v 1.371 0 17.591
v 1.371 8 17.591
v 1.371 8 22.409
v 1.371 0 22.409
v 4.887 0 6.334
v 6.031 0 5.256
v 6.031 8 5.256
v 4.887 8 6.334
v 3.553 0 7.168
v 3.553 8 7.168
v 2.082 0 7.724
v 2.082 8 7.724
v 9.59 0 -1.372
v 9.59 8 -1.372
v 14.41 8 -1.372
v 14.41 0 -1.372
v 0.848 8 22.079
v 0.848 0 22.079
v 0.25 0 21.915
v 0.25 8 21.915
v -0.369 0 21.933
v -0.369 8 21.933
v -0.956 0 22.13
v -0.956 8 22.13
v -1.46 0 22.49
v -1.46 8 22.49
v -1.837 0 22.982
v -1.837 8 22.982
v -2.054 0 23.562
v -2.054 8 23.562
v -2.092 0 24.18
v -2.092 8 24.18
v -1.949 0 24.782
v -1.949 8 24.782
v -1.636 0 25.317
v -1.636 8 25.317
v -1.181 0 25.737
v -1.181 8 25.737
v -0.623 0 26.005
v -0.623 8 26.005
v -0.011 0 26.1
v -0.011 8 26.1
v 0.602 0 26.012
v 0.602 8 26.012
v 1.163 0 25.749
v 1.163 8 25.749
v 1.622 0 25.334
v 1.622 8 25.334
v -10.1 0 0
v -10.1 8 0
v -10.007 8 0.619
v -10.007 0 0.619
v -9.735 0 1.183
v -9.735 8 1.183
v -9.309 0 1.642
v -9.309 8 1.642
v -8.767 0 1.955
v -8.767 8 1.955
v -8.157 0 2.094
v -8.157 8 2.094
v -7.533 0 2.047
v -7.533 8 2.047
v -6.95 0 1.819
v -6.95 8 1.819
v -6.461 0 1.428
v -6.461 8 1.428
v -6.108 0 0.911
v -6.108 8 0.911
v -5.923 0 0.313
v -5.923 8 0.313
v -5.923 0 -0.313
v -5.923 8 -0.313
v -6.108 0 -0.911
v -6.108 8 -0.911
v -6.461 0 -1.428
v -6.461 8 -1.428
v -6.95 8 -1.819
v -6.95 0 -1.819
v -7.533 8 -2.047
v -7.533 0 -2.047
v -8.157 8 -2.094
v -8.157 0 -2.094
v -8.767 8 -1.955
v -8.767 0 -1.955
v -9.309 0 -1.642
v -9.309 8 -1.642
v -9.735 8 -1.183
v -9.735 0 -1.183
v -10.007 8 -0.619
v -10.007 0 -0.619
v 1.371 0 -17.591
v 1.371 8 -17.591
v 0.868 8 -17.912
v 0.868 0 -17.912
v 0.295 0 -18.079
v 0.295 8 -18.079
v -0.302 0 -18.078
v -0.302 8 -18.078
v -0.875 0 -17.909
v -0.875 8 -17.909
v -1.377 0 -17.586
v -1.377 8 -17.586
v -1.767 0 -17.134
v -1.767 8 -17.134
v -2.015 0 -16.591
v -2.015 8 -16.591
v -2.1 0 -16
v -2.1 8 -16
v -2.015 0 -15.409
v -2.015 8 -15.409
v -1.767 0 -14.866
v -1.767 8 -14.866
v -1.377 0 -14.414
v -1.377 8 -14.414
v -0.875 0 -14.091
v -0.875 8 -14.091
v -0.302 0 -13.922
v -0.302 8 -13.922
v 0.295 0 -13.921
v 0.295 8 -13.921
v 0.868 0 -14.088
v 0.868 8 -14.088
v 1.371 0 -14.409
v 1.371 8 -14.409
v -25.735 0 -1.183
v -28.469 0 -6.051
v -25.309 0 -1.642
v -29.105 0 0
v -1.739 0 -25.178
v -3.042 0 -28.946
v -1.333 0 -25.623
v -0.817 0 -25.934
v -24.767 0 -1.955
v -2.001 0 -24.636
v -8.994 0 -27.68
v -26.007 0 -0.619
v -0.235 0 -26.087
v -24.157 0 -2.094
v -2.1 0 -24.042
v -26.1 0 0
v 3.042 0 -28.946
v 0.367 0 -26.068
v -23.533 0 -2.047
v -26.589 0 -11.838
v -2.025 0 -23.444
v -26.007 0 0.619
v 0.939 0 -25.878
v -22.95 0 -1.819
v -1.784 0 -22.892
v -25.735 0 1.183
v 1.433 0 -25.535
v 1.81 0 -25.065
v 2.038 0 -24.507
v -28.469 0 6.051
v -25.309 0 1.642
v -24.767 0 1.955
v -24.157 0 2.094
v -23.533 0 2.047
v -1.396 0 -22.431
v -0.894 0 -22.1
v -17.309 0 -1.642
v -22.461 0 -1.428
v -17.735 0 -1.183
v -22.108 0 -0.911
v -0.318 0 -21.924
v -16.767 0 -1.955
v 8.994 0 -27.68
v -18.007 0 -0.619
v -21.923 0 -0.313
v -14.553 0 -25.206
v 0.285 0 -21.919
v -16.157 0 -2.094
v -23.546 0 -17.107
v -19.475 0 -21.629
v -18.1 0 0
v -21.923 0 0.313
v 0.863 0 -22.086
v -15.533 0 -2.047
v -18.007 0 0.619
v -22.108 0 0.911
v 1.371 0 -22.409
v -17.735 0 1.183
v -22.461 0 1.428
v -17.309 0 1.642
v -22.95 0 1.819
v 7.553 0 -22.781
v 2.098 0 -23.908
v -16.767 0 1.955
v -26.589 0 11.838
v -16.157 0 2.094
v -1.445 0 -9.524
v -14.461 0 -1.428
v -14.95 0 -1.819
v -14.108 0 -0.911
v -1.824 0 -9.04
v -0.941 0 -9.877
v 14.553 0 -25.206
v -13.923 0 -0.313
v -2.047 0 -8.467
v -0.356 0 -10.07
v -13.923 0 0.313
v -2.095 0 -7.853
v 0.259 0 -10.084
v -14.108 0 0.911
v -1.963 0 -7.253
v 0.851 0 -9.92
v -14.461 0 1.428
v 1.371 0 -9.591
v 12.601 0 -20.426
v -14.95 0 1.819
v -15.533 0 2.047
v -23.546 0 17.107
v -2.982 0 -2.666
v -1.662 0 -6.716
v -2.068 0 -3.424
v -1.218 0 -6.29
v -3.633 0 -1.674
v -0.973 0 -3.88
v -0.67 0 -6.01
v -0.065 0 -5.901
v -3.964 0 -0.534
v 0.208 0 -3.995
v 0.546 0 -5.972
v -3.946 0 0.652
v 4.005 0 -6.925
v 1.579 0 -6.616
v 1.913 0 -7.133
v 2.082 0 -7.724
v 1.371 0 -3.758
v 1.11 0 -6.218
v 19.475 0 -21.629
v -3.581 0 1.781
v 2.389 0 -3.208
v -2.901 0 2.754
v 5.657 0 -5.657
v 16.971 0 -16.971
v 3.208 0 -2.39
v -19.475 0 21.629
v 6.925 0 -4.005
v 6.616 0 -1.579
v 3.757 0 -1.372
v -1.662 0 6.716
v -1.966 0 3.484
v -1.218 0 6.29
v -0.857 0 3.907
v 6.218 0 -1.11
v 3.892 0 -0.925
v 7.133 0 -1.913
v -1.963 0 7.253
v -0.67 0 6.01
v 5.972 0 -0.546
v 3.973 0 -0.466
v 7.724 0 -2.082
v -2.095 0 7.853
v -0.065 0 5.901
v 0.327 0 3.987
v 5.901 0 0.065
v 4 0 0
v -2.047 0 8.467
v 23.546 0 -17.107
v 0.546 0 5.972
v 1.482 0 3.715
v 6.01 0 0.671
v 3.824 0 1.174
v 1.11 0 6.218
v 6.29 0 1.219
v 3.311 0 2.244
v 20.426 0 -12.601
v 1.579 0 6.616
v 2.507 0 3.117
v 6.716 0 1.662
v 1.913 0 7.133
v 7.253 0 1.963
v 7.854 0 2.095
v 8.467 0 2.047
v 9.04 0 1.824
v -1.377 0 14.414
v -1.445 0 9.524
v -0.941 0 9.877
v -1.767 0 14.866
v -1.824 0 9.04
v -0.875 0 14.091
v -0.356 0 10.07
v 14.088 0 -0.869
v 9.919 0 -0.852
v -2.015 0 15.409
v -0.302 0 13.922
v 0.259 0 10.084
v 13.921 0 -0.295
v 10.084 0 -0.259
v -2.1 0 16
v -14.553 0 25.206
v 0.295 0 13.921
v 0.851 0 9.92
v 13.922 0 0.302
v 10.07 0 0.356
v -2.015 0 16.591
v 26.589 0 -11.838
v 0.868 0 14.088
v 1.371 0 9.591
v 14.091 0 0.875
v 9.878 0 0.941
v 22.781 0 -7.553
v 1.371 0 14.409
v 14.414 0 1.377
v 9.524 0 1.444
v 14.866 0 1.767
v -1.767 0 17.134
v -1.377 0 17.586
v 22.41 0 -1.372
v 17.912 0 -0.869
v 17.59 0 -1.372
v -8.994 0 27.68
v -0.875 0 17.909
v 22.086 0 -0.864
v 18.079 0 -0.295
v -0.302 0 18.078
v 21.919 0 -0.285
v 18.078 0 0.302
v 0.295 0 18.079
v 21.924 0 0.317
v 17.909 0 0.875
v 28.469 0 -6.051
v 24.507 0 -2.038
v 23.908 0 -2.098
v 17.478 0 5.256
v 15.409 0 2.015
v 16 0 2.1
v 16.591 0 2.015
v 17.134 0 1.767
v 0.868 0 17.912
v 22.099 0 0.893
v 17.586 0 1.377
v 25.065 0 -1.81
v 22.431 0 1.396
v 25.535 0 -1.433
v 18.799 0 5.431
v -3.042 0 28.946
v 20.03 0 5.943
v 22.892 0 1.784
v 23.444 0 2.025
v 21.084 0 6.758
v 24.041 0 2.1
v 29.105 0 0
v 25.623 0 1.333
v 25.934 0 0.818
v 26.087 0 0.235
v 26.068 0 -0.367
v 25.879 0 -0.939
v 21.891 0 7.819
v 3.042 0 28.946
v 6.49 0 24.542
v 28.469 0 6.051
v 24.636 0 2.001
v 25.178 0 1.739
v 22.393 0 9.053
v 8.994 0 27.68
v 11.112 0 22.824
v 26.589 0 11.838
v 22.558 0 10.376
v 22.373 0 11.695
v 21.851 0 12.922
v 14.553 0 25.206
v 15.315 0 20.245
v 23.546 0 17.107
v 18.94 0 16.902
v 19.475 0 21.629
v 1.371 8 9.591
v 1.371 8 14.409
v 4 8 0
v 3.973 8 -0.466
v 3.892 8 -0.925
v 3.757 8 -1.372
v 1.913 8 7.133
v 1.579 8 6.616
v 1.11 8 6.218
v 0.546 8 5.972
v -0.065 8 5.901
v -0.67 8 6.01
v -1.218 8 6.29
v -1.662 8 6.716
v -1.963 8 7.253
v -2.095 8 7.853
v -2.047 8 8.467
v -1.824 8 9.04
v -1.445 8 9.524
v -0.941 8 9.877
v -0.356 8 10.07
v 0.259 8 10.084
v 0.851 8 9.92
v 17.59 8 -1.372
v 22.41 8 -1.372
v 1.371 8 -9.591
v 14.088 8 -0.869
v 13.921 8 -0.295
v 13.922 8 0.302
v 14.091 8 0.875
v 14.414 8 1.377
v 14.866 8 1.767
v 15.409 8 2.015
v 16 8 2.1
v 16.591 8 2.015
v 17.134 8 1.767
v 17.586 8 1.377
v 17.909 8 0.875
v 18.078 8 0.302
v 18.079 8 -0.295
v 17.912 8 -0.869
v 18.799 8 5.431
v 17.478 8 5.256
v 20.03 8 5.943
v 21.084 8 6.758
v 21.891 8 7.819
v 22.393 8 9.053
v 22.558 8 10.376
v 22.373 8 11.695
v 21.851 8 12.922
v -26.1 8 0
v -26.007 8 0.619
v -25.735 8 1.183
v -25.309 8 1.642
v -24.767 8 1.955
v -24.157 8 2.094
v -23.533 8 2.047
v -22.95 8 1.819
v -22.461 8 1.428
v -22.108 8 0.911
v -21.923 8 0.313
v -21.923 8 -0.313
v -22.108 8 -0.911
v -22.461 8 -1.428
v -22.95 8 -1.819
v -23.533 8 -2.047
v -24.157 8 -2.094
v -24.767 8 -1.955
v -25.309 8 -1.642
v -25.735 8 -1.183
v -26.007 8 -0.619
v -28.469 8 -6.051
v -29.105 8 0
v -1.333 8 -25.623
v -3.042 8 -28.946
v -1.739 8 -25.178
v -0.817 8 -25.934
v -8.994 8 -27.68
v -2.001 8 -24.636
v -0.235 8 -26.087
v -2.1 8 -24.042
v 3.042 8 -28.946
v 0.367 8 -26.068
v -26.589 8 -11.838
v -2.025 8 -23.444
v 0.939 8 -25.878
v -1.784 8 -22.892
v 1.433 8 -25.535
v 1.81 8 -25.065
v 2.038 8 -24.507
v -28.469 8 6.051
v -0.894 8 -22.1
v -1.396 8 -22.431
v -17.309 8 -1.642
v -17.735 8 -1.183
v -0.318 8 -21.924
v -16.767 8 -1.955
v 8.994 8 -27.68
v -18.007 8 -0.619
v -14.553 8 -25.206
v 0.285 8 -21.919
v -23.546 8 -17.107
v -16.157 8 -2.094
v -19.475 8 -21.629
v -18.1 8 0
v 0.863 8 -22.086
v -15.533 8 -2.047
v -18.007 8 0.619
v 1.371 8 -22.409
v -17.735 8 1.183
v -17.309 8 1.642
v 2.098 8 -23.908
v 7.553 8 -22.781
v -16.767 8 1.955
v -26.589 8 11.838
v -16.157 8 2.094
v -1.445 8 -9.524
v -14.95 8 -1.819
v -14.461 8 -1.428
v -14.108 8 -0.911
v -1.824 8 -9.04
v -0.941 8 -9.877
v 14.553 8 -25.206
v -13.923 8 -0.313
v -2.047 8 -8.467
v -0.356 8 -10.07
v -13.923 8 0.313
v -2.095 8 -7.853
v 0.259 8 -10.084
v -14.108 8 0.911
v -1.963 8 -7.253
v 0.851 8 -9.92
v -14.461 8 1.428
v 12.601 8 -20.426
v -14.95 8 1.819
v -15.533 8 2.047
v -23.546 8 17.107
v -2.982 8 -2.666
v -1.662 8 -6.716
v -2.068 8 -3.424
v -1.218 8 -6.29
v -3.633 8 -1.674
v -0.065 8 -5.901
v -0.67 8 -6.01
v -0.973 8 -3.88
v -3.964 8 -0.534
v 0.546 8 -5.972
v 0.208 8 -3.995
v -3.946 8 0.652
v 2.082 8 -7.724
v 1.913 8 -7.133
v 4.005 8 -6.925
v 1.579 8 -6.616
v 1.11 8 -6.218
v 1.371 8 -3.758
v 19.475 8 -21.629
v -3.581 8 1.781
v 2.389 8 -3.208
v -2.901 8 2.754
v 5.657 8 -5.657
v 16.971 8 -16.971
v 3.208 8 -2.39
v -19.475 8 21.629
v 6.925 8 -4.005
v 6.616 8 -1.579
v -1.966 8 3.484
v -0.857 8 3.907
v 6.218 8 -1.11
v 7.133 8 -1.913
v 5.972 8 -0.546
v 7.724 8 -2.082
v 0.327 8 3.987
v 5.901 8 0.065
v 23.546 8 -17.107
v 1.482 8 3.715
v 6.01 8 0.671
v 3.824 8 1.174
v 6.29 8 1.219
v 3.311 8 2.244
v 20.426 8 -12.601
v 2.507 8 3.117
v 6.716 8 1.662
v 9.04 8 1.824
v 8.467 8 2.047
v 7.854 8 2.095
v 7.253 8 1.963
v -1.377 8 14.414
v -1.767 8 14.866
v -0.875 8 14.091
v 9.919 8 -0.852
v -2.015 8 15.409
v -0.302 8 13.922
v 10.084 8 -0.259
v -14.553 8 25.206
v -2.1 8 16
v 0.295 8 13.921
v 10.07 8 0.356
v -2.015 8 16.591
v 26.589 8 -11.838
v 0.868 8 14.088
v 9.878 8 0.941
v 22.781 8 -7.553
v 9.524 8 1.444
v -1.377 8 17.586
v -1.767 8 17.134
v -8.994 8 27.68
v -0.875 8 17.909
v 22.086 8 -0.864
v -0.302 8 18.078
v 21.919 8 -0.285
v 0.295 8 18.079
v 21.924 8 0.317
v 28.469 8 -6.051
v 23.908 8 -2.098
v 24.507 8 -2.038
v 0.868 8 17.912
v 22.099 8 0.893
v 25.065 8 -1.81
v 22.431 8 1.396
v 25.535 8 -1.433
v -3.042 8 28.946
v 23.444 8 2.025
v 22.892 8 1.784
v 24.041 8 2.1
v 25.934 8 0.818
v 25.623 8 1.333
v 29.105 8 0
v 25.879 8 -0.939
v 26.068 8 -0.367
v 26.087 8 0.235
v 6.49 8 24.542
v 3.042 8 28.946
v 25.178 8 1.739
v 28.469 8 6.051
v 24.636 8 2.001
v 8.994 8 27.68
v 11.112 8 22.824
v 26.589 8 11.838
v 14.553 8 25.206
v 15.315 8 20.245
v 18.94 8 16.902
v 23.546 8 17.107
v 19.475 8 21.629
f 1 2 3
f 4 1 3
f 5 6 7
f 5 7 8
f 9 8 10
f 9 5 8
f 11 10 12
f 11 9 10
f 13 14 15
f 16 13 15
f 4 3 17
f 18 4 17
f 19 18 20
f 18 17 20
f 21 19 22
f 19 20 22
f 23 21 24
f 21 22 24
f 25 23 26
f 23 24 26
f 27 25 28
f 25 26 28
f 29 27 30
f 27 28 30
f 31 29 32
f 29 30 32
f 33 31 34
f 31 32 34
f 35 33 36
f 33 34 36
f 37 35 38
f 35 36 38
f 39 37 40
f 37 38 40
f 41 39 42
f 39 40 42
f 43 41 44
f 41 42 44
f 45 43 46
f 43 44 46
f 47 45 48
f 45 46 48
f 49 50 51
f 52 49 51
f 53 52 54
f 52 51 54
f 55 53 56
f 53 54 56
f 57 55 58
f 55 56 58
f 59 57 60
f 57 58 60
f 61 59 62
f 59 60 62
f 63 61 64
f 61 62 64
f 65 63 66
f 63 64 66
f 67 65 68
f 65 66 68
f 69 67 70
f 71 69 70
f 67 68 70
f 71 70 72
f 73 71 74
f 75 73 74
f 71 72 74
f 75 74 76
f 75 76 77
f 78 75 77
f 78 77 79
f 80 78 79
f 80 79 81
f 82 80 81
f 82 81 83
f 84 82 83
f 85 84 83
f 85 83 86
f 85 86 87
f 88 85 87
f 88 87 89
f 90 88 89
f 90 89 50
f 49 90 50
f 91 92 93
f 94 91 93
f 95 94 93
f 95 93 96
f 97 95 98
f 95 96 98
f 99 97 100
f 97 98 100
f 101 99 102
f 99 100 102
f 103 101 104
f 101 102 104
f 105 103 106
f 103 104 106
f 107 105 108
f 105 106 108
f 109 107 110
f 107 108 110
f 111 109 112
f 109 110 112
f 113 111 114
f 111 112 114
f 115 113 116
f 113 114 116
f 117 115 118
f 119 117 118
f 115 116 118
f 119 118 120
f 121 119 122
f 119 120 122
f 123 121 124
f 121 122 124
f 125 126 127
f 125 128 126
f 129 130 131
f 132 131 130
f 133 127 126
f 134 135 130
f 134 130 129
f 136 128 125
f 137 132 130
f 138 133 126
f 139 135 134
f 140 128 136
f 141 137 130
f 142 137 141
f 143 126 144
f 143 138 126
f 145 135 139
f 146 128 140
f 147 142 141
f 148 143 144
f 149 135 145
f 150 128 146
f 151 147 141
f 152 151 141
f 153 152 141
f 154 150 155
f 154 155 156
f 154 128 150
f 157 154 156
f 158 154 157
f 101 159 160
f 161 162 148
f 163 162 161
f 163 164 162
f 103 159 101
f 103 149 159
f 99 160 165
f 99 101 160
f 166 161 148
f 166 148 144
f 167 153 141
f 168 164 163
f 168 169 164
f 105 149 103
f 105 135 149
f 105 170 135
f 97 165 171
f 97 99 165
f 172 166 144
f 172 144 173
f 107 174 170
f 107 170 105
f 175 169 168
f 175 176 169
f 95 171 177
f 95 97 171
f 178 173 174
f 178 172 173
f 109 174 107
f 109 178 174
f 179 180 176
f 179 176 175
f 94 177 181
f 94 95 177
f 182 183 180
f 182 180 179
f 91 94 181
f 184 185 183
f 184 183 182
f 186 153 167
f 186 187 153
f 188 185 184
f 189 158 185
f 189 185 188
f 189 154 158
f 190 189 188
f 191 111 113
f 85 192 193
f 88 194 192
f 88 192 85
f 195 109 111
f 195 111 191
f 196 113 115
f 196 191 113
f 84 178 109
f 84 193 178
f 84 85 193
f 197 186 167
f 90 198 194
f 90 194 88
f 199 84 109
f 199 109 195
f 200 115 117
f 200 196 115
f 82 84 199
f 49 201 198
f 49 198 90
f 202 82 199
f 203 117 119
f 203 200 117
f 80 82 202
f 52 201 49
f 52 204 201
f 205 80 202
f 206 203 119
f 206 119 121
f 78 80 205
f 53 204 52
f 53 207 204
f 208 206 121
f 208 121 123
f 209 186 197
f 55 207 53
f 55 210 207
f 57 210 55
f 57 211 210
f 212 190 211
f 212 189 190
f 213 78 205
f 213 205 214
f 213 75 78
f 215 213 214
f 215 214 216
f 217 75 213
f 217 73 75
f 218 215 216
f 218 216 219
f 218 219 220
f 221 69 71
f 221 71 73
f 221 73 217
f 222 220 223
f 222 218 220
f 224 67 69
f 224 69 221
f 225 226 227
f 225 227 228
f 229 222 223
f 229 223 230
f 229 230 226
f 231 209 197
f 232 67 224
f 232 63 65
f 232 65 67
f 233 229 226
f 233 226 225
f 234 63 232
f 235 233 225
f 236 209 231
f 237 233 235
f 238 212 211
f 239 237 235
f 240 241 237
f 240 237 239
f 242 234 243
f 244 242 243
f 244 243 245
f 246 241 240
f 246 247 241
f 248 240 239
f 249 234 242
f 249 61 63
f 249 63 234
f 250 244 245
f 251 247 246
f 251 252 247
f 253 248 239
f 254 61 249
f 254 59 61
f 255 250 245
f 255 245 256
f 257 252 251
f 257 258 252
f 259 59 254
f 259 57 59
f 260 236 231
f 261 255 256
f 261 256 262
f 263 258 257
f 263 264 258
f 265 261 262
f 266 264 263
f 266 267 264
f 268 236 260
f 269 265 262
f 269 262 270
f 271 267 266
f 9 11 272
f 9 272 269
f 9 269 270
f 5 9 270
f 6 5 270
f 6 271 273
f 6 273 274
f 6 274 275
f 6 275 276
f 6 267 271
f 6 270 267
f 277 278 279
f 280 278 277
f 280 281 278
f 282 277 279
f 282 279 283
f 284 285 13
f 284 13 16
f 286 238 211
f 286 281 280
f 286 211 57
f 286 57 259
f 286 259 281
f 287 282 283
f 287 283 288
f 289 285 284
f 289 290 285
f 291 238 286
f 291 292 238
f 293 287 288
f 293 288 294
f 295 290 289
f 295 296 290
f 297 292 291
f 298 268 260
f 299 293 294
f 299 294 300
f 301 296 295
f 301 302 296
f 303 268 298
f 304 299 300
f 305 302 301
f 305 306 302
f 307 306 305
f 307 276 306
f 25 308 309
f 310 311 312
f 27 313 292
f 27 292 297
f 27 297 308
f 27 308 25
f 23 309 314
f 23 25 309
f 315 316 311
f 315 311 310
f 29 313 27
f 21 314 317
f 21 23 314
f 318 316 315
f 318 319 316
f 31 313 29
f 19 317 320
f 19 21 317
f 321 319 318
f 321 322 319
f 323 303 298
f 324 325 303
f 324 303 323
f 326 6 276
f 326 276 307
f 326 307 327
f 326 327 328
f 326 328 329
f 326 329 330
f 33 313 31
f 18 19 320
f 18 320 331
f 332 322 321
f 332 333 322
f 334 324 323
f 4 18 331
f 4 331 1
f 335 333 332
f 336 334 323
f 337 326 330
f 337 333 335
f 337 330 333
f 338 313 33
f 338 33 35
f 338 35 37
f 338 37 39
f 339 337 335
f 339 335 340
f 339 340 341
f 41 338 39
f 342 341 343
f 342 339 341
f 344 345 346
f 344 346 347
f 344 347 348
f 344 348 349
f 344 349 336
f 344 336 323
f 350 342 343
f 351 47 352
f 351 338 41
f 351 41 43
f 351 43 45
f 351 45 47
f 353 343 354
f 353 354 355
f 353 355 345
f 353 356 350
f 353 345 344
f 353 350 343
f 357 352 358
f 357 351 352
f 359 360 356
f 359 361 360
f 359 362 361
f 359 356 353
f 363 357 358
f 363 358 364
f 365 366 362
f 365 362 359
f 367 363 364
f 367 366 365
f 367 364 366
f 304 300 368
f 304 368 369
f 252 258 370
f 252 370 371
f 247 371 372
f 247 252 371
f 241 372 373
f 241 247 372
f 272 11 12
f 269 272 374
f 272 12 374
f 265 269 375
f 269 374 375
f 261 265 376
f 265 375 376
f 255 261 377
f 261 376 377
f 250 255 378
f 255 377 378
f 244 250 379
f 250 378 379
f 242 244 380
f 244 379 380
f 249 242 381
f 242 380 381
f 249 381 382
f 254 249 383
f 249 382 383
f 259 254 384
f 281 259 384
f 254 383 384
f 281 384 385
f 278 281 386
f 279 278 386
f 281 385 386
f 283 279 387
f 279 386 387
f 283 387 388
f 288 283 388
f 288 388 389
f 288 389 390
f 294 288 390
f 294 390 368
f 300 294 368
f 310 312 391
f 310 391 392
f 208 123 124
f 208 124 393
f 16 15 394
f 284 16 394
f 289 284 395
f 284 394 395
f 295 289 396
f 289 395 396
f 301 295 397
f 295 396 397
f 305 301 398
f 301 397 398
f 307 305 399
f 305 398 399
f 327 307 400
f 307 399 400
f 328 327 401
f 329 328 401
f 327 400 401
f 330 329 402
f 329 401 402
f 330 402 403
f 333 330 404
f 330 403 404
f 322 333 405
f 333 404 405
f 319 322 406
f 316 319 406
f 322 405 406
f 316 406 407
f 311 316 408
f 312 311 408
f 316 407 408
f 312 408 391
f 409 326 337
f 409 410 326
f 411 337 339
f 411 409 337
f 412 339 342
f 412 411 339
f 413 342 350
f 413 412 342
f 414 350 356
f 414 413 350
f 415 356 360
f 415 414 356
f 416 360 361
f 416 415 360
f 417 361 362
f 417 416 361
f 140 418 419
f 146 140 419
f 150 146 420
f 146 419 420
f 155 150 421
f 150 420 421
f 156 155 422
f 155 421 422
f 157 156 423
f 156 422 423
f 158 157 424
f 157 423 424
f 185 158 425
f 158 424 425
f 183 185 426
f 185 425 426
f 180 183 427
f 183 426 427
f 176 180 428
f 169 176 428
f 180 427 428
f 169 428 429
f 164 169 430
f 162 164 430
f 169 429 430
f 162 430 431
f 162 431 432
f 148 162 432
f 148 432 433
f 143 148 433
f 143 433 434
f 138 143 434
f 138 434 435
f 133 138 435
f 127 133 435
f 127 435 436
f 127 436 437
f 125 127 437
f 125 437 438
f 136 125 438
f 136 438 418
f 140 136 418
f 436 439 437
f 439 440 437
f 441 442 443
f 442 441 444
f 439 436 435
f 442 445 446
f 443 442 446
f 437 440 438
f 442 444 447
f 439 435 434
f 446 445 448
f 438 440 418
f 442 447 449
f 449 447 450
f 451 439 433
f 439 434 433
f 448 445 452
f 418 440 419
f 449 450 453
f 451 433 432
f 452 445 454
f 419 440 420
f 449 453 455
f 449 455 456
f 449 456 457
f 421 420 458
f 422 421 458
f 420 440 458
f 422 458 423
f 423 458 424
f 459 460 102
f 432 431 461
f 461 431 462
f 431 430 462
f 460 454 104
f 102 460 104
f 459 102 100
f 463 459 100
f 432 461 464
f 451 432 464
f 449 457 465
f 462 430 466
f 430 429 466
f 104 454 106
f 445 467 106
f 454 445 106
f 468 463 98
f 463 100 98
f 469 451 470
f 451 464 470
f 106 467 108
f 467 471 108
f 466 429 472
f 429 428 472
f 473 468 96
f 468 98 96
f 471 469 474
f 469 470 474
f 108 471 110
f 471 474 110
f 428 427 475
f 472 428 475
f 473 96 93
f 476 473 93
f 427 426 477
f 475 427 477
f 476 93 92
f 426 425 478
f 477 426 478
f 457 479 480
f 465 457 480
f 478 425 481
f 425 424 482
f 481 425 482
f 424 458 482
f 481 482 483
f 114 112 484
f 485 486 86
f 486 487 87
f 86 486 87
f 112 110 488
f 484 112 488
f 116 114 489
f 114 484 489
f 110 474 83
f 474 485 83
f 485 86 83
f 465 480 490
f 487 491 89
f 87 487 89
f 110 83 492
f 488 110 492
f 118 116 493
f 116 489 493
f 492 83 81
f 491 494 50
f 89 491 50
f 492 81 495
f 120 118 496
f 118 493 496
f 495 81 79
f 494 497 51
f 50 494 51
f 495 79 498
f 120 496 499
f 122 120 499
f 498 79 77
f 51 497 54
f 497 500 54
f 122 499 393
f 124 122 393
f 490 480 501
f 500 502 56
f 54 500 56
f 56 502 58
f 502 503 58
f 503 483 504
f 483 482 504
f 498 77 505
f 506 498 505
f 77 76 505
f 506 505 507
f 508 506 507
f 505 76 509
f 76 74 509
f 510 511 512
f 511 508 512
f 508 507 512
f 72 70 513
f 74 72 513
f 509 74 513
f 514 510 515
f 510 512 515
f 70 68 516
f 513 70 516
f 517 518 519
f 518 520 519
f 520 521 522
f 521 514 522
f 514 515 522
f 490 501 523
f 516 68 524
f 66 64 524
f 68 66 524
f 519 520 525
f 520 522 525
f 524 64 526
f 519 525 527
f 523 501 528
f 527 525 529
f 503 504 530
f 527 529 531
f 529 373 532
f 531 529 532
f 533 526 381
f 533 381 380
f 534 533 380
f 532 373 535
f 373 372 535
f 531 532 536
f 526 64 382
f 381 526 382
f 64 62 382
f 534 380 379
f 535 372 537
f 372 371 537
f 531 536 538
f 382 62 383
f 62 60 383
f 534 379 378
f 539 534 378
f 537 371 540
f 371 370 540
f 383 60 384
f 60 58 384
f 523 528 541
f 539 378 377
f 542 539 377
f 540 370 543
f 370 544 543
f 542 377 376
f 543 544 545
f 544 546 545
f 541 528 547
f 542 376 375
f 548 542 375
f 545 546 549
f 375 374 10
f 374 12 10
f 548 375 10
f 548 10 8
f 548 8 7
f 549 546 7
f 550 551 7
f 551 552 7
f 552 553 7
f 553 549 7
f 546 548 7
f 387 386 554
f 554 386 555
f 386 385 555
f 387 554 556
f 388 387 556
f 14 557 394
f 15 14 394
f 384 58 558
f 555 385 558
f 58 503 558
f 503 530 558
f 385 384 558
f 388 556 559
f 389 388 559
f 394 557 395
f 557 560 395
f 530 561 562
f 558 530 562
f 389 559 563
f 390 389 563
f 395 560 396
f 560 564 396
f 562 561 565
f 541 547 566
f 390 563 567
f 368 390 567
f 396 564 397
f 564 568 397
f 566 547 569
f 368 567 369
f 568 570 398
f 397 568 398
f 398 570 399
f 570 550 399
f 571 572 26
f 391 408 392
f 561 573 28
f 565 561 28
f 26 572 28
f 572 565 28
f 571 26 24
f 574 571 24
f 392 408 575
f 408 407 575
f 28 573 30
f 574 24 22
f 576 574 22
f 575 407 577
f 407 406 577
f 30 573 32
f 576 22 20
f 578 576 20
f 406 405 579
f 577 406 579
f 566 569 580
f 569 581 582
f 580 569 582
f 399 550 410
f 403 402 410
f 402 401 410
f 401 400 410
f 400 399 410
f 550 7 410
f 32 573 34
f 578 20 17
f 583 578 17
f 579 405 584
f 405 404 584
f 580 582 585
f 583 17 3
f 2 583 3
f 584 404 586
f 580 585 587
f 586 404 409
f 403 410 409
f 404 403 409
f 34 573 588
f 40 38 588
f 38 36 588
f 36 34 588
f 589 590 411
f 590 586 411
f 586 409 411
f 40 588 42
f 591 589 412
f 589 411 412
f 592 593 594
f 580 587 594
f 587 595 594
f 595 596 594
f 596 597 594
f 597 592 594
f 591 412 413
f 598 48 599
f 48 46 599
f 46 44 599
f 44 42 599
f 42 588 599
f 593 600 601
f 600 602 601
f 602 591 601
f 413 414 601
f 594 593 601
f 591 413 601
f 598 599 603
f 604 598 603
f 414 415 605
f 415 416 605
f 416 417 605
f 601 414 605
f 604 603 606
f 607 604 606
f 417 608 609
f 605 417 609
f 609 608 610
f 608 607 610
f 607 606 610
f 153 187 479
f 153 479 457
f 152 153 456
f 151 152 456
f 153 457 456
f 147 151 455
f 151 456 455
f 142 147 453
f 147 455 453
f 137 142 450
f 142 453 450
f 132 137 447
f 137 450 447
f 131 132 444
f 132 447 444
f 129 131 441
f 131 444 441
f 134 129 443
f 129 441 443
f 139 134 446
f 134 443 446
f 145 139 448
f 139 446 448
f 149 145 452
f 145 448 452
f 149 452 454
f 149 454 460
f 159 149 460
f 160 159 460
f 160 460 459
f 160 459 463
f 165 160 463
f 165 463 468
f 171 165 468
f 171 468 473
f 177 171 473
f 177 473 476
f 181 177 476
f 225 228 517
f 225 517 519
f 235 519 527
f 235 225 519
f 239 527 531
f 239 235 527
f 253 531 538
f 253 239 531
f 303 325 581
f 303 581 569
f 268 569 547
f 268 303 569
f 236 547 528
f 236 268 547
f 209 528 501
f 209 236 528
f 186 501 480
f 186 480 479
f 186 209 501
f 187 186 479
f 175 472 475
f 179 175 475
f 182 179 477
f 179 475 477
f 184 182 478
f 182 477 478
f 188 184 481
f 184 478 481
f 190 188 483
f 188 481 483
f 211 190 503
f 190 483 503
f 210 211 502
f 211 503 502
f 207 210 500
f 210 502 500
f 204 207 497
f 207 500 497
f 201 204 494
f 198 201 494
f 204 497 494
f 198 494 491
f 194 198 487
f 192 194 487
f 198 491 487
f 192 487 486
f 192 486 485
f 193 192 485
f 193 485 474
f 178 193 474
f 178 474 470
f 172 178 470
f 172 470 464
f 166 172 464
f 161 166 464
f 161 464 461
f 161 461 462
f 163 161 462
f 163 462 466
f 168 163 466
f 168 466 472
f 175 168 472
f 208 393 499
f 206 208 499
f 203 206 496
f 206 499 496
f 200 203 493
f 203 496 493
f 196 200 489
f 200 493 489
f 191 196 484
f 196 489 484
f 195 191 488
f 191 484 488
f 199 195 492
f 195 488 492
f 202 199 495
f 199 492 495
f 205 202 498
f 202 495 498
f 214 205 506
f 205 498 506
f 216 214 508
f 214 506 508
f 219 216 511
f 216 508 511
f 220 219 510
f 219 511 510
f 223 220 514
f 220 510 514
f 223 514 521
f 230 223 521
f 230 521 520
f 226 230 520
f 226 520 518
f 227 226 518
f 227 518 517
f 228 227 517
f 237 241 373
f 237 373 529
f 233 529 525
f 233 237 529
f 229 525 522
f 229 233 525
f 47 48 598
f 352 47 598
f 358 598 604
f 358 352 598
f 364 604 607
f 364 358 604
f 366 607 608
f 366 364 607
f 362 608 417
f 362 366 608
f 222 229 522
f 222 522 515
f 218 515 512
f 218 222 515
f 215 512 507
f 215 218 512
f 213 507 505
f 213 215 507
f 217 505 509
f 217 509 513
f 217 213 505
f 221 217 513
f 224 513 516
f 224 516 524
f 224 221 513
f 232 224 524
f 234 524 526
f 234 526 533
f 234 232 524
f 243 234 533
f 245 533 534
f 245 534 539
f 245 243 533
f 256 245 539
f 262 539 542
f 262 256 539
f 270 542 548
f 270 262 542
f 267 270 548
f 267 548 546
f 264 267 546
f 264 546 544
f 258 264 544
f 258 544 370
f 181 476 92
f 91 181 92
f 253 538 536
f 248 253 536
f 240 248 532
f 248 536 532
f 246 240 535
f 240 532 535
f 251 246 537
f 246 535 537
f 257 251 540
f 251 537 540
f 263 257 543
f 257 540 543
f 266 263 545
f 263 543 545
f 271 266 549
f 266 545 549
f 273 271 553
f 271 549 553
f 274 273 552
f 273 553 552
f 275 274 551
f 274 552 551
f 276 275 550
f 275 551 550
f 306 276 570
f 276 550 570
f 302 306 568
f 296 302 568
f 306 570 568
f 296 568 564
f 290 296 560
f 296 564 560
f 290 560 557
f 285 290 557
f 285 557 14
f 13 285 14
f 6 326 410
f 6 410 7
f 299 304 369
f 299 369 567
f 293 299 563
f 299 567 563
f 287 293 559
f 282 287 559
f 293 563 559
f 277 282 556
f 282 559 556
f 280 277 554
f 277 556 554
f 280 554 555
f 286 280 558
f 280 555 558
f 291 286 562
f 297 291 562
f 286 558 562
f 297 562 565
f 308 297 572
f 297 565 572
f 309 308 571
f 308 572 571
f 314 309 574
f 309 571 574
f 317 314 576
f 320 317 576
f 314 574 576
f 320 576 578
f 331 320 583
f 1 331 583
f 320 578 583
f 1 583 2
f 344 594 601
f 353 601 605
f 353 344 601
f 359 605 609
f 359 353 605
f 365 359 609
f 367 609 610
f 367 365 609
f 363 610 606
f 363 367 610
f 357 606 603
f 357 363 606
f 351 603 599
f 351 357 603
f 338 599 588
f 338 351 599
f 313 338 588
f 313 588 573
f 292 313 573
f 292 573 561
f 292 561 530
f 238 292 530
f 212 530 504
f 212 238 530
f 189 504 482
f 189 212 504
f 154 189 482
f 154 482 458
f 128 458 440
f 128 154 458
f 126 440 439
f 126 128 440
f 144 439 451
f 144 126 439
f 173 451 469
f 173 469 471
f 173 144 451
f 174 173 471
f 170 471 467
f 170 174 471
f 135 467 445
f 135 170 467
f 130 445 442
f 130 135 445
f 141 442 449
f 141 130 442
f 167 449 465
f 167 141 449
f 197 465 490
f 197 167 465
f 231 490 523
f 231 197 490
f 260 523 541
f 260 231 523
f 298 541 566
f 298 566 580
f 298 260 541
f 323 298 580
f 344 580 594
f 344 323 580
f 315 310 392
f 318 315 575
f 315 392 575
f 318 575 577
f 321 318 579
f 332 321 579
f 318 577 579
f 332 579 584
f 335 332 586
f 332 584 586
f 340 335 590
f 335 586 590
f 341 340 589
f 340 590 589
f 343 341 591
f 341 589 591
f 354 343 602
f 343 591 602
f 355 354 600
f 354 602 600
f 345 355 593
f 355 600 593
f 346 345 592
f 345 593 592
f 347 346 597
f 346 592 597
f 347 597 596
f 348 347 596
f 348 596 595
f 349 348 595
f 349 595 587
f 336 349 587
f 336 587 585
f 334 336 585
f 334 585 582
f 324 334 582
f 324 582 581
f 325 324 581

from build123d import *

# Parameters (mm, degrees)
F0_R     = 29.105
F1_DEPTH = 8
F2_D     = 4.2
F2_DEPTH = 12.7
F2_TIP   = 1.2618073
F3_R     = 5.08


with BuildPart() as f1:
    # F0 (on Front) → F1 (new body)
    with BuildSketch(Plane.XZ):
        Circle(F0_R)
        with BuildLine():
            ThreePointArc((25.3854070023, 0), (18.4286183858, -17.4586629804), (1.3712233387, -25.3483458085))
            ThreePointArc((1.3712233387, -25.3483458085), (-25.3854070023, 0), (1.3712233387, 25.3483458085))
            ThreePointArc((1.3712233387, 25.3483458085), (16.5113444887, 19.2819706422), (24.8353761494, 5.255756862))
            ThreePointArc((24.8353761494, 5.255756862), (25.2475248319, 2.6422298411), (25.3854070023, 0))
        make_face(mode=Mode.SUBTRACT)
        with BuildLine():
            Line((1.3712233387, -23.9607960334), (1.3712233387, -15.9411337914))
            ThreePointArc((1.3712233387, -15.9411337914), (-16, 0), (1.3712233387, 15.9411337914))
            Line((1.3712233387, 15.9411337914), (1.3712233387, 23.9607960334))
            ThreePointArc((1.3712233387, 23.9607960334), (-24, 0), (1.3712233387, -23.9607960334))
        make_face()
        with BuildLine():
            Line((1.3712233387, -15.9411337914), (1.3712233387, -7.8816081199))
            ThreePointArc((1.3712233387, -7.8816081199), (-8, 0), (1.3712233387, 7.8816081199))
            Line((1.3712233387, 7.8816081199), (1.3712233387, 15.9411337914))
            ThreePointArc((1.3712233387, 15.9411337914), (-16, 0), (1.3712233387, -15.9411337914))
        make_face()
        with BuildLine():
            ThreePointArc((1.3712233387, -3.7576251217), (-3.2775671888, 2.2929355252), (4, 0))
            ThreePointArc((4, 0), (3.9389053429, -0.6964371472), (3.75748765, -1.3716))
            Line((3.75748765, -1.3716), (7.88154258, -1.3716))
            ThreePointArc((7.88154258, -1.3716), (7.970330628, -0.6883528747), (8, 0))
            ThreePointArc((8, 0), (7.4916851205, 2.8061814011), (6.031336486, 5.255756862))
            Line((6.031336486, 5.255756862), (1.3712233387, 5.255756862))
            Line((1.3712233387, 5.255756862), (1.3712233387, 7.8816081199))
            ThreePointArc((1.3712233387, 7.8816081199), (-8, 0), (1.3712233387, -7.8816081199))
            Line((1.3712233387, -7.8816081199), (1.3712233387, -3.7576251217))
        make_face()
        with BuildLine():
            Line((1.3712233387, -25.3483458085), (1.3712233387, -23.9607960334))
            ThreePointArc((1.3712233387, -23.9607960334), (-24, 0), (1.3712233387, 23.9607960334))
            Line((1.3712233387, 23.9607960334), (1.3712233387, 25.3483458085))
            ThreePointArc((1.3712233387, 25.3483458085), (-25.3854070023, 0), (1.3712233387, -25.3483458085))
        make_face()
        with BuildLine():
            ThreePointArc((23.960774475, -1.3716), (16.9704293601, -16.9706961358), (1.3712233387, -23.9607960334))
            Line((1.3712233387, -23.9607960334), (1.3712233387, -25.3483458085))
            ThreePointArc((1.3712233387, -25.3483458085), (18.4286183858, -17.4586629804), (25.3854070023, 0))
            ThreePointArc((25.3854070023, 0), (25.2475248319, 2.6422298411), (24.8353761494, 5.255756862))
            Line((24.8353761494, 5.255756862), (23.4174511808, 5.255756862))
            ThreePointArc((23.4174511808, 5.255756862), (23.8539182142, 2.6439716016), (24, 0))
            ThreePointArc((24, 0), (23.9901916145, -0.6860803892), (23.960774475, -1.3716))
        make_face()
        with BuildLine():
            ThreePointArc((8, 0), (7.970330628, -0.6883528747), (7.88154258, -1.3716))
            Line((7.88154258, -1.3716), (15.9411013873, -1.3716))
            ThreePointArc((15.9411013873, -1.3716), (15.9852685651, -0.686432008), (16, 0))
            ThreePointArc((16, 0), (15.7764756741, 2.6651107487), (15.1121480871, 5.255756862))
            Line((15.1121480871, 5.255756862), (6.031336486, 5.255756862))
            ThreePointArc((6.031336486, 5.255756862), (7.4916851205, 2.8061814011), (8, 0))
        make_face()
        with BuildLine():
            ThreePointArc((16, 0), (15.9852685651, -0.686432008), (15.9411013873, -1.3716))
            Line((15.9411013873, -1.3716), (23.960774475, -1.3716))
            ThreePointArc((23.960774475, -1.3716), (23.9901916145, -0.6860803892), (24, 0))
            ThreePointArc((24, 0), (23.8539182142, 2.6439716016), (23.4174511808, 5.255756862))
            Line((23.4174511808, 5.255756862), (15.1121480871, 5.255756862))
            ThreePointArc((15.1121480871, 5.255756862), (15.7764756741, 2.6651107487), (16, 0))
        make_face()
        with BuildLine():
            ThreePointArc((3.75748765, -1.3716), (2.828285359, -2.8285688834), (1.3712233387, -3.7576251217))
            Line((1.3712233387, -3.7576251217), (1.3712233387, -7.8816081199))
            ThreePointArc((1.3712233387, -7.8816081199), (5.656719077, -5.6569894187), (7.88154258, -1.3716))
            Line((7.88154258, -1.3716), (3.75748765, -1.3716))
        make_face()
        with BuildLine():
            ThreePointArc((6.031336486, 5.255756862), (3.9272441605, 6.9697025262), (1.3712233387, 7.8816081199))
            Line((1.3712233387, 7.8816081199), (1.3712233387, 5.255756862))
            Line((1.3712233387, 5.255756862), (6.031336486, 5.255756862))
        make_face()
    extrude(amount=-F1_DEPTH)

    # F2
    with Locations(Plane.XZ):
        with Locations((0, 24), (24, 0), (0, -24), (-24, 0), (0, 16), (16, 0), (0, -16), (-16, 0), (0, 8), (8, 0), (0, -8), (-8, 0)):
            Hole(F2_D / 2, depth=F2_DEPTH)
            with Locations((0, 0, -(F2_DEPTH + F2_TIP / 2))):  # 118° drill point
                Cone(0, F2_D / 2, F2_TIP, mode=Mode.SUBTRACT)

    # F3
    f3_edges = [f1.edges().sort_by_distance(p)[0] for p in [
        (24.835376, 4, 5.255757),
    ]]
    fillet(f3_edges, radius=F3_R)


solid = f1.part
